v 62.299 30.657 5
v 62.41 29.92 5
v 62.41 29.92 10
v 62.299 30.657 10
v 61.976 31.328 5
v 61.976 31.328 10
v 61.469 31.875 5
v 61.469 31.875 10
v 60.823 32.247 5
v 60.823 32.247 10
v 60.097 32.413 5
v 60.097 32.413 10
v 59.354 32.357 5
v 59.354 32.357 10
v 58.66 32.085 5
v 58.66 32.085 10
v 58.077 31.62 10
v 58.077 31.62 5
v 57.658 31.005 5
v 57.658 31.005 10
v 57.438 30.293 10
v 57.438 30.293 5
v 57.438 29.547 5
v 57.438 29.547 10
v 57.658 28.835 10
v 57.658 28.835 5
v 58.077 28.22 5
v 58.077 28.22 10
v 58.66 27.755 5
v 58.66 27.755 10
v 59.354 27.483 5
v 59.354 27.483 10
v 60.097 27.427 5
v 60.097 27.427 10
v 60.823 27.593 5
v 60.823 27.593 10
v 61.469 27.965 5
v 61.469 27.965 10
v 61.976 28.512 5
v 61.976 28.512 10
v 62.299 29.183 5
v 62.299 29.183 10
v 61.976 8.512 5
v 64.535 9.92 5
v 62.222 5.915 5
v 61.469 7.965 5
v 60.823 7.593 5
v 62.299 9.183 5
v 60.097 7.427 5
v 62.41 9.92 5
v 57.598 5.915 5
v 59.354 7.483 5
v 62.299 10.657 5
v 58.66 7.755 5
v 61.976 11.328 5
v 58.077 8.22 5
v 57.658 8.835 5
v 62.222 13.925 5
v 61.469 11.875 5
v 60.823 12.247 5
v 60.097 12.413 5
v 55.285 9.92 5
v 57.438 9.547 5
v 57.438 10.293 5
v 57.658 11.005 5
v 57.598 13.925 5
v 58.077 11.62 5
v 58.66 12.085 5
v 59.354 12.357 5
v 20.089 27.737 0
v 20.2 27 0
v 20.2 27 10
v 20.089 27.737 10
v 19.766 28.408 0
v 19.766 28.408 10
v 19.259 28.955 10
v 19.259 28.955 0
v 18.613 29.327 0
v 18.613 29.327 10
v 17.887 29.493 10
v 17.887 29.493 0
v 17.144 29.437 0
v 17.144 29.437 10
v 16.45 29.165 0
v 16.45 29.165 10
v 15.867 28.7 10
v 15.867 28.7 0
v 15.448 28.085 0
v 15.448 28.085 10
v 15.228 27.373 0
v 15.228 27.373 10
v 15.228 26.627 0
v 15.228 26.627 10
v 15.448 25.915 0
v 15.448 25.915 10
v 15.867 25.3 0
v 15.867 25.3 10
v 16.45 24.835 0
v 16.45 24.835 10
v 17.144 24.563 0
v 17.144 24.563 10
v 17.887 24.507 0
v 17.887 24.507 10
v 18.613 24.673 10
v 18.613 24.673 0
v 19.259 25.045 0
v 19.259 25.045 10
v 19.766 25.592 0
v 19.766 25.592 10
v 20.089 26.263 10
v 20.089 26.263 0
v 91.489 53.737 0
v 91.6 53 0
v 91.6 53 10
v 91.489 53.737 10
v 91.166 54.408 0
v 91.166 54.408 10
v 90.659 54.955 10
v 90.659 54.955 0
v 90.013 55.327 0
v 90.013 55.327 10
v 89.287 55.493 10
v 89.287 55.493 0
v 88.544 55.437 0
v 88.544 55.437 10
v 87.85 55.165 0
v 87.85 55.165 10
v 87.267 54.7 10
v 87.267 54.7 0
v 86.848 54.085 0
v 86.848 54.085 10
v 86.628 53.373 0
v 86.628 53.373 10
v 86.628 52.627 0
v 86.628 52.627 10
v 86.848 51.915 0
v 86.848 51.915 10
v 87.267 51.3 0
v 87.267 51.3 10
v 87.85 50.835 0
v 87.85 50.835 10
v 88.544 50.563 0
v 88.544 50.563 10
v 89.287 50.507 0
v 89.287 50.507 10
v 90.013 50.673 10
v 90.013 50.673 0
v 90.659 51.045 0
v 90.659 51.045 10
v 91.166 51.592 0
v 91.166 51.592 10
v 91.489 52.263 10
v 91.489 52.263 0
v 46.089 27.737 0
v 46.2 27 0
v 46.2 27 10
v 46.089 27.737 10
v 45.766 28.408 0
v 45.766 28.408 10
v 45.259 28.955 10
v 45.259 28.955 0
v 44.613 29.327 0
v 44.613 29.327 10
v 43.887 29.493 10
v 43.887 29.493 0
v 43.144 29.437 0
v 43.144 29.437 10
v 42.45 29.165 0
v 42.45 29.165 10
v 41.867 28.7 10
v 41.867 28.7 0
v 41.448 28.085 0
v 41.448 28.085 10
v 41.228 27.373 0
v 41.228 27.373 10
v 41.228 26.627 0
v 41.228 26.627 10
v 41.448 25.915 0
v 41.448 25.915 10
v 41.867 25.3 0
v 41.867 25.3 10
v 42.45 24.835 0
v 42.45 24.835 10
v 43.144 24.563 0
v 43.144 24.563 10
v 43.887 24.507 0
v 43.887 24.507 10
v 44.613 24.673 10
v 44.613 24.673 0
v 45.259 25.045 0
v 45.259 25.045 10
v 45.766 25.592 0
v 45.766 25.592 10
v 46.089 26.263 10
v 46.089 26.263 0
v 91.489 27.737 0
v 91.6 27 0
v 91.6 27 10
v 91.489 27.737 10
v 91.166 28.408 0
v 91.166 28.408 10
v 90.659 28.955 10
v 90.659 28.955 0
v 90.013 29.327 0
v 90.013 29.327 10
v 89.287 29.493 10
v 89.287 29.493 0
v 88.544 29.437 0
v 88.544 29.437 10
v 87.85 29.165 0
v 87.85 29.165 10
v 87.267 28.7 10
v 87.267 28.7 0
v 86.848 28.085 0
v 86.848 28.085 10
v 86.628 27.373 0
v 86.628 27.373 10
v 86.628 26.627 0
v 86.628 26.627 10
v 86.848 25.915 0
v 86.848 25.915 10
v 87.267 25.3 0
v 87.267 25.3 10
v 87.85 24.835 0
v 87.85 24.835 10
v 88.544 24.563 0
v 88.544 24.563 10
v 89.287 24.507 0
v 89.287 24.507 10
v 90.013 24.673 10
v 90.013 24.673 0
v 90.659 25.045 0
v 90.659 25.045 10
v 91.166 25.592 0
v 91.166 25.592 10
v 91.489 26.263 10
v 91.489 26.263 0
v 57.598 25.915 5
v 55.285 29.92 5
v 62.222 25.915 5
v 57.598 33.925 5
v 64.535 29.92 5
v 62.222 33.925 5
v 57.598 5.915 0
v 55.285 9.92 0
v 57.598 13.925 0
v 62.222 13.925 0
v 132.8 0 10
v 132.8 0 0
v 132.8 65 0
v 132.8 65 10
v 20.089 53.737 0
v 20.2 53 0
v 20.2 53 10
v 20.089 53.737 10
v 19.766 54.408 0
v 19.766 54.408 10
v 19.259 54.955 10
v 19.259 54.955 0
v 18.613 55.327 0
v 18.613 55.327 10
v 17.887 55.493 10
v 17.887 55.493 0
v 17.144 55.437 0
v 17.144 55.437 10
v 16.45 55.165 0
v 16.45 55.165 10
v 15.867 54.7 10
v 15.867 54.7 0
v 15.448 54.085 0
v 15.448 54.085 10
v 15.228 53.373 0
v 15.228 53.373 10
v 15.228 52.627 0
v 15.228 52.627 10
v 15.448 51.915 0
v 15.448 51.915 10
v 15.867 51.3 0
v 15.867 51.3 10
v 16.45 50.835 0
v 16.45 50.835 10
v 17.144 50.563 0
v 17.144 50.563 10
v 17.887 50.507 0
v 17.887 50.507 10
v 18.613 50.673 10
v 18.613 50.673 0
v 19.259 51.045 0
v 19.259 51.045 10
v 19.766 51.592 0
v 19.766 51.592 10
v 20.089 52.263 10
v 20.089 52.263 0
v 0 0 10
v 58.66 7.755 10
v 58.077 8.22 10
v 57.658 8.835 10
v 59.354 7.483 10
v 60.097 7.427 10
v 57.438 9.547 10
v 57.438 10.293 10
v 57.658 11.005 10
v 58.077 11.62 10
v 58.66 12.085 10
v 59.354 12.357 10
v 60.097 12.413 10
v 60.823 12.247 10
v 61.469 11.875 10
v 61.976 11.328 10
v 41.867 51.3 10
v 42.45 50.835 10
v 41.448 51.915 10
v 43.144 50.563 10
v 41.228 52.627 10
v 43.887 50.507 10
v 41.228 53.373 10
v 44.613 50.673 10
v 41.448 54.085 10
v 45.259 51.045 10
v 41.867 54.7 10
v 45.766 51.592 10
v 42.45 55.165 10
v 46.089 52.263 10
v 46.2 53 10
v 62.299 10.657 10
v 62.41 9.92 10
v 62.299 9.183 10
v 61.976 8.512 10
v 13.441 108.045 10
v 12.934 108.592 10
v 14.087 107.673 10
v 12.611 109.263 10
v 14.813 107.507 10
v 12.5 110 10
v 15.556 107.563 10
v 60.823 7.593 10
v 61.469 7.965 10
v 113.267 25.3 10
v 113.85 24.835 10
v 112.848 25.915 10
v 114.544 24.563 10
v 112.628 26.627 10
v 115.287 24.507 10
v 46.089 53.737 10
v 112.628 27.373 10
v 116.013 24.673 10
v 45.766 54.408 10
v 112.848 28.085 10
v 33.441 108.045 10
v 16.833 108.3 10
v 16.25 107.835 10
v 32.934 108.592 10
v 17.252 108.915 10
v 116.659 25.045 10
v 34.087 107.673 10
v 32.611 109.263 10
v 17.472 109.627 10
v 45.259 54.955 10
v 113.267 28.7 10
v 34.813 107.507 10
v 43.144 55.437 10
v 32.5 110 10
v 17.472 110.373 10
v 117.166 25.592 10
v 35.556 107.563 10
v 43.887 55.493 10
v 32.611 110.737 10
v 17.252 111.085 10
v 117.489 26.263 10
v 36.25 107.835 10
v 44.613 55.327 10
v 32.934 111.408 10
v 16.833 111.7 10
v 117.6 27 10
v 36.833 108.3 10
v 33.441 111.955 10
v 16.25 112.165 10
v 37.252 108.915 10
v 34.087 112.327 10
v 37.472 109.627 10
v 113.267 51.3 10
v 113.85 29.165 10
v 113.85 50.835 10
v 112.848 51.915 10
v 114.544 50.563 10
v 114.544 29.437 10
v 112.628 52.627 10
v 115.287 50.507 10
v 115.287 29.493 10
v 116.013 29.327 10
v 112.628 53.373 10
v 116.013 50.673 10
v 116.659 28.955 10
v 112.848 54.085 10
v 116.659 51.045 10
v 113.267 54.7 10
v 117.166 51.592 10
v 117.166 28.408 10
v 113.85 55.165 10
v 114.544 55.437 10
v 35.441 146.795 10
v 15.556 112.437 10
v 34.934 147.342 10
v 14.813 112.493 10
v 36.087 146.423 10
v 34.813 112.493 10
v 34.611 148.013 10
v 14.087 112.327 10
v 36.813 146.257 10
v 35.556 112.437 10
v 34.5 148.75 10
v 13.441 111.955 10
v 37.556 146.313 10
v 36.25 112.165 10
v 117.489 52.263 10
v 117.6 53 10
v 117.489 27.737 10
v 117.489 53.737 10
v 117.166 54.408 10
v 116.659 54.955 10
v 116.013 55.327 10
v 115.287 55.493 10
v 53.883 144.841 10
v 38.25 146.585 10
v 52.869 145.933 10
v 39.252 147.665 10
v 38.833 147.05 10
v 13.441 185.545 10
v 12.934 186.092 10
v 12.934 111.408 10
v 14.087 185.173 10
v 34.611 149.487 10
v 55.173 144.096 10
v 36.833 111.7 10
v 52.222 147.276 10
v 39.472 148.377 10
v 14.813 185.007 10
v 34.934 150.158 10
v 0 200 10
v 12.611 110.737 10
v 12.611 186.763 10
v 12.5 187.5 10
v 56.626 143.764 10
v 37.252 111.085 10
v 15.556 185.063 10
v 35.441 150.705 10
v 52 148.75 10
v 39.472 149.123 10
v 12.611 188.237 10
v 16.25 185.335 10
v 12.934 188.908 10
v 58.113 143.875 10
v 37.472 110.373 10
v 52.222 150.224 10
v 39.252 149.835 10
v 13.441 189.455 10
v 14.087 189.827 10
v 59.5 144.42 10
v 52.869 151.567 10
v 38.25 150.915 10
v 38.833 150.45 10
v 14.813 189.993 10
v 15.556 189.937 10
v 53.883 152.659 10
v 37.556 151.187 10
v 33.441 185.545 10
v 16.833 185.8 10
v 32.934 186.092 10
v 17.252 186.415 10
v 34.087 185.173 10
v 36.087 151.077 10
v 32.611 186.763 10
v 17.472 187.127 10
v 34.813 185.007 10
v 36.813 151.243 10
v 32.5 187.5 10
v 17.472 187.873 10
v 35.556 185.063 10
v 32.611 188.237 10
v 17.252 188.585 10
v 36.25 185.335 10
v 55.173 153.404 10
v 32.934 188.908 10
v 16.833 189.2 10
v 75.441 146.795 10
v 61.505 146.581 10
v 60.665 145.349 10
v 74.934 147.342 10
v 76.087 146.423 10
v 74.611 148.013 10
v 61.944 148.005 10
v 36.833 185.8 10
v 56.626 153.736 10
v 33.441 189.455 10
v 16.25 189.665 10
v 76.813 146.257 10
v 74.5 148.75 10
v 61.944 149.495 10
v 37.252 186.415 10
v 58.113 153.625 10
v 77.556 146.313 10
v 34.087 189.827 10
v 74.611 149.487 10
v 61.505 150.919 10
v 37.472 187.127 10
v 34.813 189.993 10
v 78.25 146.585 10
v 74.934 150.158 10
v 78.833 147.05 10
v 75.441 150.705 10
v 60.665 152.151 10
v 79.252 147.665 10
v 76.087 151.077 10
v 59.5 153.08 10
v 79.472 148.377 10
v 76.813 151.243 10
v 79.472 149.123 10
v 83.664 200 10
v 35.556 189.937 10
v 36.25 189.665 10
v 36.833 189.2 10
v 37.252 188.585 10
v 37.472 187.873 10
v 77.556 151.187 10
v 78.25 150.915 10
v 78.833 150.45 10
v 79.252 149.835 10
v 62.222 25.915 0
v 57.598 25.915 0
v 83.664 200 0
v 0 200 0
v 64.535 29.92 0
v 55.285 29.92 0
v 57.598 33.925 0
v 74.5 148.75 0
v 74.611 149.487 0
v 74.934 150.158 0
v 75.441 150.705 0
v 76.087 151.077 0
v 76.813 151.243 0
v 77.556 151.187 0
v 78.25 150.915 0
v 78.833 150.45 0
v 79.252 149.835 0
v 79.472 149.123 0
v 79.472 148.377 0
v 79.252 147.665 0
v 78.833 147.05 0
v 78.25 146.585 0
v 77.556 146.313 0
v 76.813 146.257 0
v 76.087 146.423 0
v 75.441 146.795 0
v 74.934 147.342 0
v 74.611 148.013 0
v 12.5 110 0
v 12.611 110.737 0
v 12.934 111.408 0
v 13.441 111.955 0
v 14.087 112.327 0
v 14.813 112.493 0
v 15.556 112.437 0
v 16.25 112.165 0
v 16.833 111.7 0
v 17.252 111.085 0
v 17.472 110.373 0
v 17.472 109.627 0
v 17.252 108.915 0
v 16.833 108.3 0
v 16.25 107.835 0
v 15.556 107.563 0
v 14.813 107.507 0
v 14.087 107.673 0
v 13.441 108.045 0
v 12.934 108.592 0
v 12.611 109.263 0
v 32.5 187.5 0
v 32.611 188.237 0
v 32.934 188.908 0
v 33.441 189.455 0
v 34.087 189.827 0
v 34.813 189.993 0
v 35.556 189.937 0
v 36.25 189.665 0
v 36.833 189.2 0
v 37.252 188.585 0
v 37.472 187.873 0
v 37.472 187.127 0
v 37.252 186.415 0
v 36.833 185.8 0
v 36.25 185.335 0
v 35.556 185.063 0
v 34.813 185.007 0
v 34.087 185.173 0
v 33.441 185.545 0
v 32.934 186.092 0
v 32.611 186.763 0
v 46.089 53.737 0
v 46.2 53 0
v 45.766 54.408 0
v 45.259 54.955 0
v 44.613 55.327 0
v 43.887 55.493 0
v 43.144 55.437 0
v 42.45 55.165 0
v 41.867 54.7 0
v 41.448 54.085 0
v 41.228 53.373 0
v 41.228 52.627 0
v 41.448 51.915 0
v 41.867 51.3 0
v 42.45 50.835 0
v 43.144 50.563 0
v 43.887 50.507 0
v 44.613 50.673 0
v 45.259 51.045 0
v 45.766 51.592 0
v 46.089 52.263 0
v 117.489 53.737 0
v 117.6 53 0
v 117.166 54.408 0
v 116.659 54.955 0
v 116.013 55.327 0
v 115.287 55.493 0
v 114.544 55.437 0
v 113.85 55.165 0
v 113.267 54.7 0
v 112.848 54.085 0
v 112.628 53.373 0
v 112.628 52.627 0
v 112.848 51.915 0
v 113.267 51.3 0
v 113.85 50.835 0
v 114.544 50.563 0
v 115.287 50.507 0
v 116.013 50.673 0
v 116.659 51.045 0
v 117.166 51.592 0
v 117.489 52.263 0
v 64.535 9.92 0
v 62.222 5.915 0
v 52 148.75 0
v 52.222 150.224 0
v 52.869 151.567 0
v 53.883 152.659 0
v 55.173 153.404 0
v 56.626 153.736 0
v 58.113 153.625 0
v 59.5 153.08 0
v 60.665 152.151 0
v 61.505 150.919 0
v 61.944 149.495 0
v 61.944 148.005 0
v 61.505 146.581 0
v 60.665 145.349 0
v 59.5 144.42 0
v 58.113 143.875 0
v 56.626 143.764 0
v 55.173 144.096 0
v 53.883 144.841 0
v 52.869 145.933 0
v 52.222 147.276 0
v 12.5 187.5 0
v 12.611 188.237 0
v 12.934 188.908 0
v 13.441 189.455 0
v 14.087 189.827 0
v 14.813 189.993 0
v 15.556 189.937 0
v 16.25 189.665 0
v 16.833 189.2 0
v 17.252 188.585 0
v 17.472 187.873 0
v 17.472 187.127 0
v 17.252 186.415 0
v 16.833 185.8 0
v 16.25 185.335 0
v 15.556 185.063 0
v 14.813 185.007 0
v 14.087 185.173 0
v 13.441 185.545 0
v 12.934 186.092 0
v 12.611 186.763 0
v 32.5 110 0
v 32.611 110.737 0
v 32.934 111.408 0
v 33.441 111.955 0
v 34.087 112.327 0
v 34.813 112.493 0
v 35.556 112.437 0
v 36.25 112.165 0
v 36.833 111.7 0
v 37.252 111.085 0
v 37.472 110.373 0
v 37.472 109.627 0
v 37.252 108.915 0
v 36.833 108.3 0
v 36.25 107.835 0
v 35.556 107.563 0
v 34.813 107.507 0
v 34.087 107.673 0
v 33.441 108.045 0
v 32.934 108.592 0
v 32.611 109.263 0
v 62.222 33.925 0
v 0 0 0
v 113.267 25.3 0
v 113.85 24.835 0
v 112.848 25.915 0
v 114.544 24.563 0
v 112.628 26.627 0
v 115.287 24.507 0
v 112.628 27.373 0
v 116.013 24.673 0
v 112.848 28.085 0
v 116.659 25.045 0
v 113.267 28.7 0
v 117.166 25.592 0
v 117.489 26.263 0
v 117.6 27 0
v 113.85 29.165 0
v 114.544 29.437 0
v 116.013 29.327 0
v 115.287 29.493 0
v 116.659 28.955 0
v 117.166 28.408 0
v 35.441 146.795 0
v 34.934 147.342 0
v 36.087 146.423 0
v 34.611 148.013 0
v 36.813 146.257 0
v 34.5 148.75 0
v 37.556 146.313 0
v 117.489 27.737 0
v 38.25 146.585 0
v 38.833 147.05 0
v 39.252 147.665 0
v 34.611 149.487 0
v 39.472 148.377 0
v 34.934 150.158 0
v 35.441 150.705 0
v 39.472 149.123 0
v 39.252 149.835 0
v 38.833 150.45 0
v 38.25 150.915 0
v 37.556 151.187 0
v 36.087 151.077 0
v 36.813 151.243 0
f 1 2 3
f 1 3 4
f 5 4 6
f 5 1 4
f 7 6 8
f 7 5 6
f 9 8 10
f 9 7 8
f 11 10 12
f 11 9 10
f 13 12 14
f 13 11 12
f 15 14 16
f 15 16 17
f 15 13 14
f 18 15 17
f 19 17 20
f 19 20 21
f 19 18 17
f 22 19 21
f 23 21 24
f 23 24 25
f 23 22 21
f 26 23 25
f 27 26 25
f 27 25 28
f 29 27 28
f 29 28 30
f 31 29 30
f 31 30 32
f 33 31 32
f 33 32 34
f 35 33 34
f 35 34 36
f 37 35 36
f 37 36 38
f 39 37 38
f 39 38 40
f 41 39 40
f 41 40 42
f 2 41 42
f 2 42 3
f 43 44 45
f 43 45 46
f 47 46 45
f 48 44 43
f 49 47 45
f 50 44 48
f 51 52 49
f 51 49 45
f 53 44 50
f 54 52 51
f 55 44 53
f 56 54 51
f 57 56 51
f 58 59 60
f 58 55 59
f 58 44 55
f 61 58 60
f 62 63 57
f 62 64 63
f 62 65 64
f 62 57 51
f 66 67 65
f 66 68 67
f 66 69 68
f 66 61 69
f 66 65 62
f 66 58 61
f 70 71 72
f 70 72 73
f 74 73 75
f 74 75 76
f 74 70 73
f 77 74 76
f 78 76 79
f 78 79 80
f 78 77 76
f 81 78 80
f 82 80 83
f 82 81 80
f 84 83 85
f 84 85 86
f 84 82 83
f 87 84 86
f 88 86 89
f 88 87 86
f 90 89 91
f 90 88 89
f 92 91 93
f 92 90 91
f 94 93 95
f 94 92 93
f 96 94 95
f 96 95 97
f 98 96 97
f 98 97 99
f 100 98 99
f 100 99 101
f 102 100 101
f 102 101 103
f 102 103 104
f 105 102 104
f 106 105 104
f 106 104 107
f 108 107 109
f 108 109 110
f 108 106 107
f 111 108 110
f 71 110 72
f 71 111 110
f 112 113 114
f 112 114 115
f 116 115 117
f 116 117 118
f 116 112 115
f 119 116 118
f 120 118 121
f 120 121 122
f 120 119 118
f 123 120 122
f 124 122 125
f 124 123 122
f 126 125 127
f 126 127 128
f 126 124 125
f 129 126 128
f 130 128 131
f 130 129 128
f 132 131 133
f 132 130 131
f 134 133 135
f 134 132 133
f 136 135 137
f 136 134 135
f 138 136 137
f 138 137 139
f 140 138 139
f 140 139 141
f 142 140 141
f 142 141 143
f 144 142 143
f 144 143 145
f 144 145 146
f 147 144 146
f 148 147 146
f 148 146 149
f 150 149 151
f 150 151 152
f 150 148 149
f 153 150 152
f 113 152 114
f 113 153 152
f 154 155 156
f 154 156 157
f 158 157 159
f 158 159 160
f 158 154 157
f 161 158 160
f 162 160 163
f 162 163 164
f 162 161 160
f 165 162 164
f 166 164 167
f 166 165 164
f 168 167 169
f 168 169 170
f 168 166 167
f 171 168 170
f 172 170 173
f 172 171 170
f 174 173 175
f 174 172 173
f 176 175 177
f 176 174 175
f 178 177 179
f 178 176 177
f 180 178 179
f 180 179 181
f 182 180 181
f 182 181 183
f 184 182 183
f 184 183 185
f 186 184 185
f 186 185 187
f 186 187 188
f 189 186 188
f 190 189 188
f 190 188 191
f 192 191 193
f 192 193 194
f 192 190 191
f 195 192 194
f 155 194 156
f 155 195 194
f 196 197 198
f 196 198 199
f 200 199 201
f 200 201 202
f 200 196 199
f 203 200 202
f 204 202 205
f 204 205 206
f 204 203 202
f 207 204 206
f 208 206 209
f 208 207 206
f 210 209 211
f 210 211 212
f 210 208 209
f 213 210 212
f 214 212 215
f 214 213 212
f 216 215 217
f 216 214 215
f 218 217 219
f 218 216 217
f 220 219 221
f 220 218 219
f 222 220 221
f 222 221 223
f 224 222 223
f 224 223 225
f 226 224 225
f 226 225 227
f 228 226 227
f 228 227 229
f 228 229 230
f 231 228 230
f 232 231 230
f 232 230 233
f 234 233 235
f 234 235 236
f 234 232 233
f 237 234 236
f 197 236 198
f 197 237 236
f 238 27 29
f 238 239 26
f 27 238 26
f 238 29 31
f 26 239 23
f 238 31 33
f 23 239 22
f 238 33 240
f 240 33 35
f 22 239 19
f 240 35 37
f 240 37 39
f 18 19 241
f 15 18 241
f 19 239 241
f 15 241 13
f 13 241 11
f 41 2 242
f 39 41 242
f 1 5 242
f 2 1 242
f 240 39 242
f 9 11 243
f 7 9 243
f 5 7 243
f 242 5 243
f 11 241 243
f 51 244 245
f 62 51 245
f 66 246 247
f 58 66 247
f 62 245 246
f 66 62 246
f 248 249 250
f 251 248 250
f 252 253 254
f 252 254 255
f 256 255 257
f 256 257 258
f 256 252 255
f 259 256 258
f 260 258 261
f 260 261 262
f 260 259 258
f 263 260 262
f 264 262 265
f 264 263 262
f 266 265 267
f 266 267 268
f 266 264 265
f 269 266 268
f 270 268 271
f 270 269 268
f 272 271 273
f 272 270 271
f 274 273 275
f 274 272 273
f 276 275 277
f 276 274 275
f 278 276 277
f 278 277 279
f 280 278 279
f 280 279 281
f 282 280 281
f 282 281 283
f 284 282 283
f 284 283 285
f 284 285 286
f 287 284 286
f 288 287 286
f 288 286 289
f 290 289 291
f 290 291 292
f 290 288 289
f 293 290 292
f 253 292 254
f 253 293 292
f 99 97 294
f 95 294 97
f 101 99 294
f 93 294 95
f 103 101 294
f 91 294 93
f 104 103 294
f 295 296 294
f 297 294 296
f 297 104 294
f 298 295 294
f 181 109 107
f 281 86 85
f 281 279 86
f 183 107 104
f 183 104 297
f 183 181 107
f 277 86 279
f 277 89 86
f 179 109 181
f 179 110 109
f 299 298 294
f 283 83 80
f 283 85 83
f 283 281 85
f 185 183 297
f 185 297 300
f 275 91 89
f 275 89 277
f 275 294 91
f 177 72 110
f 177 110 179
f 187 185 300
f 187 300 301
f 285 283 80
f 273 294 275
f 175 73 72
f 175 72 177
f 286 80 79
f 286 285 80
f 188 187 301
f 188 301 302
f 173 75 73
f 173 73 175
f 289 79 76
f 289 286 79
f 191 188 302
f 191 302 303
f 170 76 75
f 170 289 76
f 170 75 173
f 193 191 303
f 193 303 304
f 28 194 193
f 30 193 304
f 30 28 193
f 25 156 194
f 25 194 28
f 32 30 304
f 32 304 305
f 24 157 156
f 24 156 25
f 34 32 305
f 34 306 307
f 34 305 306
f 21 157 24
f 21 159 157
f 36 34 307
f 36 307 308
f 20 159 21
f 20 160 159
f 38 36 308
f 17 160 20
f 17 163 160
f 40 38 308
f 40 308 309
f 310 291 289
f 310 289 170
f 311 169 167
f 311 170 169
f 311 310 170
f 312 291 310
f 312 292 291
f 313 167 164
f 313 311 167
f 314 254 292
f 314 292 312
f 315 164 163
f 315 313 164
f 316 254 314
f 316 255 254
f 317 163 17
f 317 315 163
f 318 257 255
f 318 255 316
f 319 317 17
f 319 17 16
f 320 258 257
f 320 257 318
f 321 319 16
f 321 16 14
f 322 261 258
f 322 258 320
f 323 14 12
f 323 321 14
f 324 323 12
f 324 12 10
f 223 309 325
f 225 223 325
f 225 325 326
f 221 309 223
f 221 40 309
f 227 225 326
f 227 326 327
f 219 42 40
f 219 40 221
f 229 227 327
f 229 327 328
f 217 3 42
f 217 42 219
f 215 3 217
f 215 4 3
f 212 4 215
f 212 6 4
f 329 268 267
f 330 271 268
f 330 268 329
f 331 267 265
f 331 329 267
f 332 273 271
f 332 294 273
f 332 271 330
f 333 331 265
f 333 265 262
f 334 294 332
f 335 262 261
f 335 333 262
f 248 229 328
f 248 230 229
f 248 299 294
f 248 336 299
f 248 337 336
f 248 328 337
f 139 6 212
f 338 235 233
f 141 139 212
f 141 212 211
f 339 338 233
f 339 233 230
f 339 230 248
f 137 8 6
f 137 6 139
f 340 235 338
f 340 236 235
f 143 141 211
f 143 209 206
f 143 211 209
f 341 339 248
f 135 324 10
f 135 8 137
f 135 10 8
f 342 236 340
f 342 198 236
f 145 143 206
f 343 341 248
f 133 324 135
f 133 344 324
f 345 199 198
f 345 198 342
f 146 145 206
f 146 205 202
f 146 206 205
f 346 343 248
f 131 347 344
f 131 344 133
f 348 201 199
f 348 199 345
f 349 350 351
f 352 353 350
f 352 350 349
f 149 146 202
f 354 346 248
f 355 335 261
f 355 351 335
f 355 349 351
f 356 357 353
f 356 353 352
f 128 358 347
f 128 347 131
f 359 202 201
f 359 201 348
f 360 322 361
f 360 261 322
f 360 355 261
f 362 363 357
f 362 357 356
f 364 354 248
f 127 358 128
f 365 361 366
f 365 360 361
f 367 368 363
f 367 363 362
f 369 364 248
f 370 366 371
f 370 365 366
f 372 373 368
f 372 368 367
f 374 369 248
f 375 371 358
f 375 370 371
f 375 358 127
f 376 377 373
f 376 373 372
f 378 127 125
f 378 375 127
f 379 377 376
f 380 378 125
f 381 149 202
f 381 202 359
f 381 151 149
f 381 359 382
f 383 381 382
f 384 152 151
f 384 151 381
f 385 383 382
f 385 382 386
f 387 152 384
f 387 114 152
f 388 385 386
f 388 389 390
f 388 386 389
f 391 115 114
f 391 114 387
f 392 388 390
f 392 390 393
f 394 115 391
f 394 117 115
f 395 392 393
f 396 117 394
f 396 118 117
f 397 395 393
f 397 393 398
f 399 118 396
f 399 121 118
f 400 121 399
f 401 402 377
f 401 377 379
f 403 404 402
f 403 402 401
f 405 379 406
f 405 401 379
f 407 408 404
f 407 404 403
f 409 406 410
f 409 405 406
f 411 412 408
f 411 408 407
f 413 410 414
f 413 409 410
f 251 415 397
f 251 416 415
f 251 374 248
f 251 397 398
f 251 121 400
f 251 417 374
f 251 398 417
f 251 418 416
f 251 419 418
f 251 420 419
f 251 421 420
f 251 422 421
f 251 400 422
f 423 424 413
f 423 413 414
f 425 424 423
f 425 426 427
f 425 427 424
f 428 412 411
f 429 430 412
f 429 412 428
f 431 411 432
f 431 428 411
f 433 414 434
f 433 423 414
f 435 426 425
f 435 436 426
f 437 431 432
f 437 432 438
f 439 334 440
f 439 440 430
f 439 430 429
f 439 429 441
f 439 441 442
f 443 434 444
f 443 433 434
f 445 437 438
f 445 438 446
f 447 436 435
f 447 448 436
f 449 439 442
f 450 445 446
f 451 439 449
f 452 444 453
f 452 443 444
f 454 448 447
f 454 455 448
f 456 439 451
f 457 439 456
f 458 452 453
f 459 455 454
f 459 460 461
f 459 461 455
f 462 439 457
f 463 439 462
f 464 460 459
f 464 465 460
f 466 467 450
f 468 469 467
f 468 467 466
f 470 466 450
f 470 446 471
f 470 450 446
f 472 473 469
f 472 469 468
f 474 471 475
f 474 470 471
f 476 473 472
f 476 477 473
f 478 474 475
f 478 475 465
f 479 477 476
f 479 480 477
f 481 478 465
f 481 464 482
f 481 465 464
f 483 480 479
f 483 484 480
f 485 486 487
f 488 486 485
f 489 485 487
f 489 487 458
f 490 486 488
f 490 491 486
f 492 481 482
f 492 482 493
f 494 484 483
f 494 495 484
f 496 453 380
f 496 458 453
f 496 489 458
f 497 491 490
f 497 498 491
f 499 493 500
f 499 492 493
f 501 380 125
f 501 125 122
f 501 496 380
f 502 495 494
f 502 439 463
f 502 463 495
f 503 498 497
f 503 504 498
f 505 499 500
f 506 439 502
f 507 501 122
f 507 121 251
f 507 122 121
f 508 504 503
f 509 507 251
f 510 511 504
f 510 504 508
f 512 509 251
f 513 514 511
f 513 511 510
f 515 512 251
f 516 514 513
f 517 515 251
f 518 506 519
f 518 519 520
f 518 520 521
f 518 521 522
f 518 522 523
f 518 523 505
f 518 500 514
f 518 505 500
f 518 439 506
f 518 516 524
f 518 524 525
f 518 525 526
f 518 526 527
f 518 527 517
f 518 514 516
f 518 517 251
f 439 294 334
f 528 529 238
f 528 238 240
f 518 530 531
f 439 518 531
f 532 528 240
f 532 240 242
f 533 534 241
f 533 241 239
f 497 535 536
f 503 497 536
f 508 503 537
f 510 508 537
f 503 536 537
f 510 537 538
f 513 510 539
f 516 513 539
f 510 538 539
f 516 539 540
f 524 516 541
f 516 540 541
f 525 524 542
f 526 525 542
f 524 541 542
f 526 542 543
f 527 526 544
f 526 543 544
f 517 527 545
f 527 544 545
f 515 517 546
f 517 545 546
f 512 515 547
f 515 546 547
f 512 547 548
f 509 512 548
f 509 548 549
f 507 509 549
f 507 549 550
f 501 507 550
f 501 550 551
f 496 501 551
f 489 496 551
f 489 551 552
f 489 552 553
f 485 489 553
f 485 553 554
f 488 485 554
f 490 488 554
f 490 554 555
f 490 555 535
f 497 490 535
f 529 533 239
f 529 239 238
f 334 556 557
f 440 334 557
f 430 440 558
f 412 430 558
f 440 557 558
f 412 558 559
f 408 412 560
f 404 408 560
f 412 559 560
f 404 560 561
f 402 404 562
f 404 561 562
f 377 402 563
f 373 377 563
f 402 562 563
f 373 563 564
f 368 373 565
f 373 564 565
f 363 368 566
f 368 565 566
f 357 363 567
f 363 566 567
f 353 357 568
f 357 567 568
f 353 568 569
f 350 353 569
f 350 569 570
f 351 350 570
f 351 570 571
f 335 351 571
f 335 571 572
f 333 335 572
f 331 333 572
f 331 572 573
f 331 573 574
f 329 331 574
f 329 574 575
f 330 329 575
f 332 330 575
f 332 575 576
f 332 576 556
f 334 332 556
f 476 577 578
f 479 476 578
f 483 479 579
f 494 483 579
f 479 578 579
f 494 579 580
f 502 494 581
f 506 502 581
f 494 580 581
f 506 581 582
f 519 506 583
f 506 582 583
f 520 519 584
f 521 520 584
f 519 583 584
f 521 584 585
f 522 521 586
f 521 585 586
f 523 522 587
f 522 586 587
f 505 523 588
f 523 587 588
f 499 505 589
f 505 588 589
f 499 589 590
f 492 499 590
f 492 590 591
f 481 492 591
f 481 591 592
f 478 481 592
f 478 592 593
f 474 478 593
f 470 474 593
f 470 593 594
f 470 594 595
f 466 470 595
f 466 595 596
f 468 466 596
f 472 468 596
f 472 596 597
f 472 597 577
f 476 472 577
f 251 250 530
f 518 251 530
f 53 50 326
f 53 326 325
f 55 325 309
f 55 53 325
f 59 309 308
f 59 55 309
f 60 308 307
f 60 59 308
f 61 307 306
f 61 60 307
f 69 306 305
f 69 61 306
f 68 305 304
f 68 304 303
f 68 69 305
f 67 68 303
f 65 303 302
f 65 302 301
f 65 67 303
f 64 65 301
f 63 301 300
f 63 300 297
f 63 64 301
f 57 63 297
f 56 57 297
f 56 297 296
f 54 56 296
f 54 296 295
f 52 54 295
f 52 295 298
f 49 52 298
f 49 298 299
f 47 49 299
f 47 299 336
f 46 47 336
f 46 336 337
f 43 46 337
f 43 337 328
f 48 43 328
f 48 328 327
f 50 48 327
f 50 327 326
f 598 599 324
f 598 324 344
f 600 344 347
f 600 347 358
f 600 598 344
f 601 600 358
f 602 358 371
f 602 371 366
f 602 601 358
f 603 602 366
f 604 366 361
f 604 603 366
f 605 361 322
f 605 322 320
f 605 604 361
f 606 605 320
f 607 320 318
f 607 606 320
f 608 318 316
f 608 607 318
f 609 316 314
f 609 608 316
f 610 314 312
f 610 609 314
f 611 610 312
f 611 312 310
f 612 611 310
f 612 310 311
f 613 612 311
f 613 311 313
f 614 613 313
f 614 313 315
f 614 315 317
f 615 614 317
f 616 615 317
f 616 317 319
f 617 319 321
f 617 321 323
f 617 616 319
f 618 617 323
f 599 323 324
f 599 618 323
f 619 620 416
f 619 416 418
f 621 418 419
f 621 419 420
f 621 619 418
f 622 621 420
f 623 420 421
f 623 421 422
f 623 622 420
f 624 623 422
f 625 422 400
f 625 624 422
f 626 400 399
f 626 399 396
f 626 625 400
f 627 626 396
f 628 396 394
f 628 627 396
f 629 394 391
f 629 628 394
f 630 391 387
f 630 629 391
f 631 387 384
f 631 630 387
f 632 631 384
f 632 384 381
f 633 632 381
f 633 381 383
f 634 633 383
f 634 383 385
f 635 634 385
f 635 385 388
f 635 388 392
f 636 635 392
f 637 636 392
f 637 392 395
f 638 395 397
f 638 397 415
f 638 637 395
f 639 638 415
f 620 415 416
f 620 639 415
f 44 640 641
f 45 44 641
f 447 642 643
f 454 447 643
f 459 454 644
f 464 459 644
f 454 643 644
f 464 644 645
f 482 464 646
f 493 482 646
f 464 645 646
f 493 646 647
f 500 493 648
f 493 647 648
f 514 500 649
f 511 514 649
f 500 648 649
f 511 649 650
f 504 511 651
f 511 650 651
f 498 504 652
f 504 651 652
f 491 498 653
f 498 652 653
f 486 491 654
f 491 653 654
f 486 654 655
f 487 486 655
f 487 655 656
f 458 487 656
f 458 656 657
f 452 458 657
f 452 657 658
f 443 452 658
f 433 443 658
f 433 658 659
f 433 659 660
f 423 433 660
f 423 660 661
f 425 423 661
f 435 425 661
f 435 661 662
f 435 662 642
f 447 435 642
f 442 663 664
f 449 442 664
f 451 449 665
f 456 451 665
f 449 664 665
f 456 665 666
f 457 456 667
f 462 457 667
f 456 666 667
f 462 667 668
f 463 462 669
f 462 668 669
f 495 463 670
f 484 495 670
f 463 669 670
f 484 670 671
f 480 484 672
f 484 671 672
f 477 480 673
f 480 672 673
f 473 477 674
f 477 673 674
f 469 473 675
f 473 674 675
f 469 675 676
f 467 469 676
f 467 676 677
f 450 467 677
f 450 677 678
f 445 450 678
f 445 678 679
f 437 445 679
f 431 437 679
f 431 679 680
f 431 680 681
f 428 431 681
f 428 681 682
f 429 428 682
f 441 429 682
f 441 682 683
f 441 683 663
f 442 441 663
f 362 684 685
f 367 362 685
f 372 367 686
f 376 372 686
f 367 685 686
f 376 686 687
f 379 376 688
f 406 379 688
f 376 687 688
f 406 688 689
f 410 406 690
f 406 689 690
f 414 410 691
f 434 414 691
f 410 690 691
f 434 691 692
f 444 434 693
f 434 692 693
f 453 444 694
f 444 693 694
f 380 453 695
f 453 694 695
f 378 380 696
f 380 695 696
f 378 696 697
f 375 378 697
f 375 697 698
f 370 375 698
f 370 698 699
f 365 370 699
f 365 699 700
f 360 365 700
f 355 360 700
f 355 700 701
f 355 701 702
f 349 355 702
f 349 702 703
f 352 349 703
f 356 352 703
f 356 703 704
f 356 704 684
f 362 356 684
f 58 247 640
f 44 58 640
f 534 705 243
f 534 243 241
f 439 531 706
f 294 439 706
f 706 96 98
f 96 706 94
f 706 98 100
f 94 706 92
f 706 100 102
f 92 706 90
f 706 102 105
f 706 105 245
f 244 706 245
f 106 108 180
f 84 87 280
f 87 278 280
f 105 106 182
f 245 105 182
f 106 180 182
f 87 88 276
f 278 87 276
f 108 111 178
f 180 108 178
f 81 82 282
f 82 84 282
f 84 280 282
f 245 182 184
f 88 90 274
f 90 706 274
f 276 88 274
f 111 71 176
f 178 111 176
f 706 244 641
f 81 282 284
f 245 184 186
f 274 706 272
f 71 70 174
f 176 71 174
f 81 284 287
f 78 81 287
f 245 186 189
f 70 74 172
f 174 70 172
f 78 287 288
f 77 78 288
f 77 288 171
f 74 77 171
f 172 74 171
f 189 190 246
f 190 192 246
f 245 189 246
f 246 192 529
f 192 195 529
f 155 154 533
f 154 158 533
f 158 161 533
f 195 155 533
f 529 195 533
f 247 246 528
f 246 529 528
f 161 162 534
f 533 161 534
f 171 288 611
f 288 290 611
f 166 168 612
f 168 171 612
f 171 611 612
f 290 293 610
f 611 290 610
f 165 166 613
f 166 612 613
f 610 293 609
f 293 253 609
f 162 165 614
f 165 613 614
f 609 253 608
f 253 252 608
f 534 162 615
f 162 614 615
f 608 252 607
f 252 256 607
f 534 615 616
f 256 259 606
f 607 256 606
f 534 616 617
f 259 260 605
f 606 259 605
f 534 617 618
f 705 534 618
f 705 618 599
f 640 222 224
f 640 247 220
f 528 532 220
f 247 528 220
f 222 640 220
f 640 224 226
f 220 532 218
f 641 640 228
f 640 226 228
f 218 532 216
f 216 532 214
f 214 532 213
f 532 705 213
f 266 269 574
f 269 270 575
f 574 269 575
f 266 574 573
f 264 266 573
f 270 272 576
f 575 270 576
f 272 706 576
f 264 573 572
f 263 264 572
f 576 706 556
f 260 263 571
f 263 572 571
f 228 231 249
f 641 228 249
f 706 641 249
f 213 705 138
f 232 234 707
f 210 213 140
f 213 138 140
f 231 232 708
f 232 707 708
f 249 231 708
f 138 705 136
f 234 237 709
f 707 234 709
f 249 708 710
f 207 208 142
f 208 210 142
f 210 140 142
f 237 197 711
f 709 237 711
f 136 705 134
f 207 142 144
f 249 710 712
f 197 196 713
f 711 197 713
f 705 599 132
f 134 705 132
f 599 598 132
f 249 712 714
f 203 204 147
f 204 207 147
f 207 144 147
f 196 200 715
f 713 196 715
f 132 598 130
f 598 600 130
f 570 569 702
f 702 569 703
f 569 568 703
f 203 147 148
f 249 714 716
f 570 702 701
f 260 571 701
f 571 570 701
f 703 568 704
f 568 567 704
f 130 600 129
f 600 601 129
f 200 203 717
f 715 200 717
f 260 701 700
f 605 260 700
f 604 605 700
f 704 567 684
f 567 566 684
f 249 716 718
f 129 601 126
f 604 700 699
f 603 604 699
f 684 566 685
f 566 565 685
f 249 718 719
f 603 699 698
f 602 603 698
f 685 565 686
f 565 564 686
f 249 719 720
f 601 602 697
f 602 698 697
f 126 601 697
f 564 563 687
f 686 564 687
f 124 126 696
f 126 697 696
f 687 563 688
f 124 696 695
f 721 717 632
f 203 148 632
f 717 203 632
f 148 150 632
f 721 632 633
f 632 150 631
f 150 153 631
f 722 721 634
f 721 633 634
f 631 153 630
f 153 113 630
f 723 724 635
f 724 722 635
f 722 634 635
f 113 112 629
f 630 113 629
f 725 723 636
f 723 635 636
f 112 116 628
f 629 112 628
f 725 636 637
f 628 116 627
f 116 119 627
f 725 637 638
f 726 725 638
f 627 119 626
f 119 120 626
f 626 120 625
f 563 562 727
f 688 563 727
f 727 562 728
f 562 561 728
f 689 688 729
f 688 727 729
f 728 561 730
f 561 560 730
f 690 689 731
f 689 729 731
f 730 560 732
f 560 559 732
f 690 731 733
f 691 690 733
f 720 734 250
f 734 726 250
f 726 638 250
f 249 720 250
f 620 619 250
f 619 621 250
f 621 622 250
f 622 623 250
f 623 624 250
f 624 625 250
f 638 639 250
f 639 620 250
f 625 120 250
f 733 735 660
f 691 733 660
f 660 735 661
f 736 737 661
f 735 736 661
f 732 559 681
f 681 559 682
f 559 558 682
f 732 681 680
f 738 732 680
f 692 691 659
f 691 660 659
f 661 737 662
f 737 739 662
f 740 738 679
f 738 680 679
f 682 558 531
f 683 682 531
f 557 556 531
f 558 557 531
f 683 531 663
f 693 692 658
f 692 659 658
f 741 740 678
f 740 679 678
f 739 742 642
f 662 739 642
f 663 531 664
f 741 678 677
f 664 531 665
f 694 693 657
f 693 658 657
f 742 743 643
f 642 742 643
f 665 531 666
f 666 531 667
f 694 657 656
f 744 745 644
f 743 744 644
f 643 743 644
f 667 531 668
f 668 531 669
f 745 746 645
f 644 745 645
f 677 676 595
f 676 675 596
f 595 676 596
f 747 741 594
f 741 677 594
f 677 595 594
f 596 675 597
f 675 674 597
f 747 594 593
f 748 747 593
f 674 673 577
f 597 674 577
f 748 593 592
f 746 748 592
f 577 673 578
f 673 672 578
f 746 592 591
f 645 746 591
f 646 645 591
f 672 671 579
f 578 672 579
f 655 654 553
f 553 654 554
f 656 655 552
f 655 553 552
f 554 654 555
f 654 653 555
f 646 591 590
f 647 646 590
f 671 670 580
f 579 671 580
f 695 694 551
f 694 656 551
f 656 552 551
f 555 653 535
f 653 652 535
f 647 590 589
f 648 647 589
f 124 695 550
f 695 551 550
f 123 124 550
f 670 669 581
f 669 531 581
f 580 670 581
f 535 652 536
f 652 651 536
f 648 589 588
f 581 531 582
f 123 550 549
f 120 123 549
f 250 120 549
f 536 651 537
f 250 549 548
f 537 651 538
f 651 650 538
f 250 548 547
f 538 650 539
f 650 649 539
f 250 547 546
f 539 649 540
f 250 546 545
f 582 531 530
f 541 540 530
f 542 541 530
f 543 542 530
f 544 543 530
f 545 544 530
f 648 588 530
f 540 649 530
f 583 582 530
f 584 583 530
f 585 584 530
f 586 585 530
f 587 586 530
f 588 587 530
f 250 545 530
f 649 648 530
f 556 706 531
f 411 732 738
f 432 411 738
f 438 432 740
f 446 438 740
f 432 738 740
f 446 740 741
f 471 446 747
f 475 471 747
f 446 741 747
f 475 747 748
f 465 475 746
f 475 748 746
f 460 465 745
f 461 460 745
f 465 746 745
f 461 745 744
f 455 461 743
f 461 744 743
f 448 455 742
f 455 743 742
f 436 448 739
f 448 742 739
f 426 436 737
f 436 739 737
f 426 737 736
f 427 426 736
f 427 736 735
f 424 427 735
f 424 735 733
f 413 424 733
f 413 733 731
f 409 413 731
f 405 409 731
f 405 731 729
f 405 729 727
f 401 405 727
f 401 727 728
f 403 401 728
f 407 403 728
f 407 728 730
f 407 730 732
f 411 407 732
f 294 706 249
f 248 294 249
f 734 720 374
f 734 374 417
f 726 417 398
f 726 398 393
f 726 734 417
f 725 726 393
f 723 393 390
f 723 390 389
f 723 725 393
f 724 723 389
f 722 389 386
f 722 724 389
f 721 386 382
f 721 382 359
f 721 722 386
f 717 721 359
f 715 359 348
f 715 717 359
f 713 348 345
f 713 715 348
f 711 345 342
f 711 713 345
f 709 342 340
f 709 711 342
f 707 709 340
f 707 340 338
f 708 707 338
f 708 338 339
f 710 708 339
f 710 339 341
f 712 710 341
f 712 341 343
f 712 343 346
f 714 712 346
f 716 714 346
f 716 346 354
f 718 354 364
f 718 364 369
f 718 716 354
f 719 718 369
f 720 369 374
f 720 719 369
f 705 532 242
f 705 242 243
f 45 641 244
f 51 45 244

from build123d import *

# Parameters (mm, degrees)
SKETCH1_R           = 2.5
BOSS_EXTRUDE1_DEPTH = 10
SKETCH1_3_R         = 2.5
CUT_EXTRUDE1_DEPTH  = 5
SKETCH2_R           = 2.5
SKETCH2_R_2         = 5
CUT_EXTRUDE2_DEPTH  = 241.282833344


with BuildPart() as part:
    # Sketch1 → Boss-Extrude1 (new body)
    with BuildSketch(Plane.XY):
        Polygon((0, 200), (0, 0), (132.8, 0), (132.8, 65), (83.664018374, 200), align=None)
        with Locations((17.7, 27)):
            Circle(SKETCH1_R, mode=Mode.SUBTRACT)
        with Locations((43.7, 27)):
            Circle(SKETCH1_R, mode=Mode.SUBTRACT)
        with Locations((17.7, 53)):
            Circle(SKETCH1_R, mode=Mode.SUBTRACT)
        with Locations((43.7, 53)):
            Circle(SKETCH1_R, mode=Mode.SUBTRACT)
        with Locations((89.1, 27)):
            Circle(SKETCH1_R, mode=Mode.SUBTRACT)
        with Locations((115.1, 27)):
            Circle(SKETCH1_R, mode=Mode.SUBTRACT)
        with Locations((89.1, 53)):
            Circle(SKETCH1_R, mode=Mode.SUBTRACT)
        with Locations((115.1, 53)):
            Circle(SKETCH1_R, mode=Mode.SUBTRACT)
        with Locations((59.91, 9.92)):
            Circle(SKETCH1_R, mode=Mode.SUBTRACT)
        with Locations((59.91, 29.92)):
            Circle(SKETCH1_R, mode=Mode.SUBTRACT)
    extrude(amount=BOSS_EXTRUDE1_DEPTH)

    # Sketch1<3> → Cut-Extrude1 (cut)
    # profile 1 of 2: a face of its own
    with BuildSketch(Plane.XY):
        Polygon((62.2225, 25.914632507), (64.535, 29.92), (62.2225, 33.925367493), (57.5975, 33.925367493), (55.285, 29.92), (57.5975, 25.914632507), align=None)
        with Locations((59.91, 29.92)):
            Circle(SKETCH1_3_R, mode=Mode.SUBTRACT)
    # profile 2 of 2: a face of its own
    with BuildSketch(Plane.XY):
        Polygon((64.535, 9.92), (62.2225, 13.925367493), (57.5975, 13.925367493), (55.285, 9.92), (57.5975, 5.914632507), (62.2225, 5.914632507), align=None)
        with Locations((59.91, 9.92)):
            Circle(SKETCH1_3_R, mode=Mode.SUBTRACT)
    extrude(amount=CUT_EXTRUDE1_DEPTH, mode=Mode.SUBTRACT)

    # Sketch2 → Cut-Extrude2 (cut, through all)
    with BuildSketch(Plane(origin=(0, 0, 0), x_dir=(-1, 0, 0), z_dir=(0, 0, -1))):
        with Locations((-35, 187.5)):
            Circle(SKETCH2_R)
        with Locations((-15, 187.5)):
            Circle(SKETCH2_R)
        with Locations((-35, 110)):
            Circle(SKETCH2_R)
        with Locations((-15, 110)):
            Circle(SKETCH2_R)
        with Locations((-57, 148.75)):
            Circle(SKETCH2_R_2)
        with Locations((-77, 148.75)):
            Circle(SKETCH2_R)
        with Locations((-37, 148.75)):
            Circle(SKETCH2_R)
    extrude(amount=-CUT_EXTRUDE2_DEPTH, mode=Mode.SUBTRACT)


solid = part.part
